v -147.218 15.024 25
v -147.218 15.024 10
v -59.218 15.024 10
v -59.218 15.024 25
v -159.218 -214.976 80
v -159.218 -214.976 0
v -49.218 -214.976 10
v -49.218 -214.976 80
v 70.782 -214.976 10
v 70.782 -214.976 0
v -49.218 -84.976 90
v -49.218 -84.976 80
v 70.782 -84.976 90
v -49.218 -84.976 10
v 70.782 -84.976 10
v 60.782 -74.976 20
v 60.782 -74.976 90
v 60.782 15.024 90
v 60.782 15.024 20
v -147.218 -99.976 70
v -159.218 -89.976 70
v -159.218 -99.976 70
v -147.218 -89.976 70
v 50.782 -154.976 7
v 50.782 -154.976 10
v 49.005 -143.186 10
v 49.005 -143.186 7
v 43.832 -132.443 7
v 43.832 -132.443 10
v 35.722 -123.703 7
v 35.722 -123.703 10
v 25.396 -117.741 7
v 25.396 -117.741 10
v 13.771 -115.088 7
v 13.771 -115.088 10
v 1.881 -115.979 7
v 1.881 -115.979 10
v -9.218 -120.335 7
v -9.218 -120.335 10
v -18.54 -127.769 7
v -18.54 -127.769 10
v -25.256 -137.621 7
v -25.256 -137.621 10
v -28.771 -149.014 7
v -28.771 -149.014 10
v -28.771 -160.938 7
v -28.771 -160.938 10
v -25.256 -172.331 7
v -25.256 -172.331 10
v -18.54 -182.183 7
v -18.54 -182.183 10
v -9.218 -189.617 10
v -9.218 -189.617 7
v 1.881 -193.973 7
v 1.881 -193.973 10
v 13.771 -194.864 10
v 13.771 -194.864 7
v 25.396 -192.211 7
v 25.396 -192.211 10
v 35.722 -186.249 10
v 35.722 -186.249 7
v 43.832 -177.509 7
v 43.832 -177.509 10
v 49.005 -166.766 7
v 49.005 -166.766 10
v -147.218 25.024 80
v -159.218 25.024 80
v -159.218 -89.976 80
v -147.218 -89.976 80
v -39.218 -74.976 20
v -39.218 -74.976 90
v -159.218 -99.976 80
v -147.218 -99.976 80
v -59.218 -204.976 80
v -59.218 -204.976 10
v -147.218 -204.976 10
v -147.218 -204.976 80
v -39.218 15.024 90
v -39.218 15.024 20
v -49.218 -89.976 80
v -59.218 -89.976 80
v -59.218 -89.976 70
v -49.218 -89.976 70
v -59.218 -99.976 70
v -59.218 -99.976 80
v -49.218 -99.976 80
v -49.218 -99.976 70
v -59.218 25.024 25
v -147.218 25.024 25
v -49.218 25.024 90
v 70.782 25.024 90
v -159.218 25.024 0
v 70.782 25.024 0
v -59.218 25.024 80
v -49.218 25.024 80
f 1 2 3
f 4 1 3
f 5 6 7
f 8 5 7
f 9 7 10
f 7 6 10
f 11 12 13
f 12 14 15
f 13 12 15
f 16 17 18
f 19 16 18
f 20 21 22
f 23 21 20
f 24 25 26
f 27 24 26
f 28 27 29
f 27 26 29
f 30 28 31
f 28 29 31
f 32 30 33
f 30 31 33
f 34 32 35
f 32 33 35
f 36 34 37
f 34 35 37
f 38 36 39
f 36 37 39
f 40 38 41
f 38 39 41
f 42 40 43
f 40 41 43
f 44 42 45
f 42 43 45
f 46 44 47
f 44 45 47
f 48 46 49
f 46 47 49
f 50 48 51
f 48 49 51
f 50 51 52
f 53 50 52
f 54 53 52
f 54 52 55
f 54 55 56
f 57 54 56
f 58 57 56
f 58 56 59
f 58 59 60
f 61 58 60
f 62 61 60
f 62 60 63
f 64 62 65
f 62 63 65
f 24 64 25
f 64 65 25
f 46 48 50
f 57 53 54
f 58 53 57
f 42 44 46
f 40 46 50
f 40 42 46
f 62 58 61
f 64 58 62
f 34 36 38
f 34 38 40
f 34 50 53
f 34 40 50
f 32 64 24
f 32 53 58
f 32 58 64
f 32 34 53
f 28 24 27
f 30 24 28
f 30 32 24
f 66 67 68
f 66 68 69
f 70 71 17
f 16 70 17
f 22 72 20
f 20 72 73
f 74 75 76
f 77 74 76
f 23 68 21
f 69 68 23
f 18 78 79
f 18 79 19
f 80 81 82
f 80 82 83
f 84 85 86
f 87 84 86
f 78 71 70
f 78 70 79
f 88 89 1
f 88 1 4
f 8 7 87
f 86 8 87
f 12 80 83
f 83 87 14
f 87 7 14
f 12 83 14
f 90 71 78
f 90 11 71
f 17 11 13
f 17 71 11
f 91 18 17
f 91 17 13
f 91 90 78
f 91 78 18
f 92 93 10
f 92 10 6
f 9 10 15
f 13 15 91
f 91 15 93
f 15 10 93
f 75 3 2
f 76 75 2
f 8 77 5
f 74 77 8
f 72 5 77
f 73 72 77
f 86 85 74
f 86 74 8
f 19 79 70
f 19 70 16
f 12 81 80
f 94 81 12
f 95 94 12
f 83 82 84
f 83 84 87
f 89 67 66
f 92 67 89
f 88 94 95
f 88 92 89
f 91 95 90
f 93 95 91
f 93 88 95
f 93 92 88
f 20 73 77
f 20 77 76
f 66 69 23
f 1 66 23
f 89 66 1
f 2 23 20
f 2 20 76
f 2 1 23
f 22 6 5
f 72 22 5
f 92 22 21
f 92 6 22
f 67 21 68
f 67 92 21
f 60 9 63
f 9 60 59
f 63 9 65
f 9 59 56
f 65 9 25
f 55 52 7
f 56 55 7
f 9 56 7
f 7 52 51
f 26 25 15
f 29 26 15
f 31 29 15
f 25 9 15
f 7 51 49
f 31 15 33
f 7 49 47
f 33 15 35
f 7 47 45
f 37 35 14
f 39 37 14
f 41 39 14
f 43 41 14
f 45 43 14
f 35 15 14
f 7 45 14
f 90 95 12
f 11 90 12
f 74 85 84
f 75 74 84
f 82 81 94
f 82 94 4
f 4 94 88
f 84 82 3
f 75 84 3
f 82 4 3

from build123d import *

# Parameters (mm, degrees)
RESSALTO_EXTRUS_O1_DEPTH = 10
ESBO_O2_W                = 10
ESBO_O2_H                = 10
ESBO_O2_W_2              = 210
ESBO_O2_H_2              = 220
RESSALTO_EXTRUS_O4_DEPTH = 70
ESBO_O7_R                = 40
CORTE_EXTRUS_O1_DEPTH    = 3
ESBO_O21_W               = 200
ESBO_O21_H               = 45
CORTE_EXTRUS_O5_DEPTH    = 100
RESSALTO_EXTRUS_O5_DEPTH = 80
ESBO_O29_W               = 110
ESBO_O29_H               = 80
CORTE_EXTRUS_O8_DEPTH    = 250
ESBO_O30_W               = 12
ESBO_O30_H               = 10
RESSALTO_EXTRUS_O6_DEPTH = 50
ESBO_O31_W               = 100
ESBO_O31_H               = 90
CORTE_EXTRUS_O9_DEPTH    = 70
ESBO_O38_W               = 12
ESBO_O38_H               = 70
RESSALTO_EXTRUS_O8_DEPTH = 220
ESBO_O39_W               = 10
ESBO_O39_H               = 10
ESBO_O39_W_2             = 12
CORTE_EXTRUS_O10_DEPTH   = 10
ESBO_O40_W               = 88
ESBO_O40_H               = 10
CORTE_EXTRUS_O11_DEPTH   = 10


with BuildPart() as part:
    # Esboço1 → Ressalto-extrusão1 (new body)
    with BuildSketch(Plane.XY):
        Polygon((-99.217703787, 25.02394247), (70.782296213, 25.02394247), (70.782296213, 0), (70.782296213, -214.97605753), (-99.217703787, -214.97605753), (-269.217703787, -214.97605753), (-269.217703787, 0), (-269.217703787, 25.02394247), align=None)
    extrude(amount=RESSALTO_EXTRUS_O1_DEPTH)

    # Esboço2 → Ressalto-extrusão4 (add)
    with BuildSketch(Plane.XY.offset(10)):
        with Locations((-54.217703787, -209.97605753)):
            Rectangle(ESBO_O2_W, ESBO_O2_H)
        with Locations((-164.217703787, -209.97605753)):
            Rectangle(ESBO_O2_W_2, ESBO_O2_H)
        with Locations((-54.217703787, -94.97605753)):
            Rectangle(ESBO_O2_W, ESBO_O2_H_2)
        Polygon((-59.217703787, 15.02394247), (-49.217703787, 15.02394247), (-49.217703787, 25.02394247), (-269.217703787, 25.02394247), (-269.217703787, 15.02394247), align=None)
    extrude(amount=RESSALTO_EXTRUS_O4_DEPTH)

    # Esboço7 → Corte-extrusão1 (cut)
    with BuildSketch(Plane.XY.offset(10)):
        with Locations((10.782296213, -154.97605753)):
            Circle(ESBO_O7_R)
    extrude(amount=-CORTE_EXTRUS_O1_DEPTH, mode=Mode.SUBTRACT)

    # Esboço21 → Corte-extrusão5 (cut)
    with BuildSketch(Plane(origin=(0, 25.02394247, 0), x_dir=(1, 0, 0), z_dir=(0, 1, 0))):
        with Locations((-159.217703787, -47.5)):
            Rectangle(ESBO_O21_W, ESBO_O21_H)
    extrude(amount=-CORTE_EXTRUS_O5_DEPTH, mode=Mode.SUBTRACT)

    # Esboço28 → Ressalto-extrusão5 (add)
    with BuildSketch(Plane.XY.offset(10)):
        Polygon((70.782296213, -84.97605753), (70.782296213, 25.02394247), (60.782296213, 25.02394247), (-39.217703787, 25.02394247), (-49.217703787, 25.02394247), (-49.217703787, -74.97605753), (-49.217703787, -84.97605753), align=None)
    extrude(amount=RESSALTO_EXTRUS_O5_DEPTH)

    # Esboço29 → Corte-extrusão8 (cut)
    with BuildSketch(Plane.XZ.offset(214.97605753)):
        with Locations((-214.217703787, 40)):
            Rectangle(ESBO_O29_W, ESBO_O29_H)
    extrude(amount=-CORTE_EXTRUS_O8_DEPTH, mode=Mode.SUBTRACT)

    # Esboço30 → Ressalto-extrusão6 (add)
    with BuildSketch(Plane.XY.offset(25)):
        with Locations((-153.217703787, 20.02394247)):
            Rectangle(ESBO_O30_W, ESBO_O30_H)
    extrude(amount=RESSALTO_EXTRUS_O6_DEPTH)

    # Esboço31 → Corte-extrusão9 (cut)
    with BuildSketch(Plane.XY.offset(90)):
        with Locations((10.782296213, -29.97605753)):
            Rectangle(ESBO_O31_W, ESBO_O31_H)
    extrude(amount=-CORTE_EXTRUS_O9_DEPTH, mode=Mode.SUBTRACT)

    # Esboço38 → Ressalto-extrusão8 (add)
    with BuildSketch(Plane.XZ.offset(-15.02394247)):
        with Locations((-153.217703787, 45)):
            Rectangle(ESBO_O38_W, ESBO_O38_H)
    extrude(amount=RESSALTO_EXTRUS_O8_DEPTH)

    # Esboço39 → Corte-extrusão10 (cut)
    with BuildSketch(Plane.XY.offset(80)):
        with Locations((-54.217703787, -94.97605753)):
            Rectangle(ESBO_O39_W, ESBO_O39_H)
        with Locations((-153.217703787, -94.97605753)):
            Rectangle(ESBO_O39_W_2, ESBO_O39_H)
    extrude(amount=-CORTE_EXTRUS_O10_DEPTH, mode=Mode.SUBTRACT)

    # Esboço40 → Corte-extrusão11 (cut)
    with BuildSketch(Plane(origin=(0, 25.02394247, 0), x_dir=(1, 0, 0), z_dir=(0, 1, 0))):
        with Locations((-103.217703787, -75)):
            Rectangle(ESBO_O40_W, ESBO_O40_H)
    extrude(amount=-CORTE_EXTRUS_O11_DEPTH, mode=Mode.SUBTRACT)


solid = part.part
